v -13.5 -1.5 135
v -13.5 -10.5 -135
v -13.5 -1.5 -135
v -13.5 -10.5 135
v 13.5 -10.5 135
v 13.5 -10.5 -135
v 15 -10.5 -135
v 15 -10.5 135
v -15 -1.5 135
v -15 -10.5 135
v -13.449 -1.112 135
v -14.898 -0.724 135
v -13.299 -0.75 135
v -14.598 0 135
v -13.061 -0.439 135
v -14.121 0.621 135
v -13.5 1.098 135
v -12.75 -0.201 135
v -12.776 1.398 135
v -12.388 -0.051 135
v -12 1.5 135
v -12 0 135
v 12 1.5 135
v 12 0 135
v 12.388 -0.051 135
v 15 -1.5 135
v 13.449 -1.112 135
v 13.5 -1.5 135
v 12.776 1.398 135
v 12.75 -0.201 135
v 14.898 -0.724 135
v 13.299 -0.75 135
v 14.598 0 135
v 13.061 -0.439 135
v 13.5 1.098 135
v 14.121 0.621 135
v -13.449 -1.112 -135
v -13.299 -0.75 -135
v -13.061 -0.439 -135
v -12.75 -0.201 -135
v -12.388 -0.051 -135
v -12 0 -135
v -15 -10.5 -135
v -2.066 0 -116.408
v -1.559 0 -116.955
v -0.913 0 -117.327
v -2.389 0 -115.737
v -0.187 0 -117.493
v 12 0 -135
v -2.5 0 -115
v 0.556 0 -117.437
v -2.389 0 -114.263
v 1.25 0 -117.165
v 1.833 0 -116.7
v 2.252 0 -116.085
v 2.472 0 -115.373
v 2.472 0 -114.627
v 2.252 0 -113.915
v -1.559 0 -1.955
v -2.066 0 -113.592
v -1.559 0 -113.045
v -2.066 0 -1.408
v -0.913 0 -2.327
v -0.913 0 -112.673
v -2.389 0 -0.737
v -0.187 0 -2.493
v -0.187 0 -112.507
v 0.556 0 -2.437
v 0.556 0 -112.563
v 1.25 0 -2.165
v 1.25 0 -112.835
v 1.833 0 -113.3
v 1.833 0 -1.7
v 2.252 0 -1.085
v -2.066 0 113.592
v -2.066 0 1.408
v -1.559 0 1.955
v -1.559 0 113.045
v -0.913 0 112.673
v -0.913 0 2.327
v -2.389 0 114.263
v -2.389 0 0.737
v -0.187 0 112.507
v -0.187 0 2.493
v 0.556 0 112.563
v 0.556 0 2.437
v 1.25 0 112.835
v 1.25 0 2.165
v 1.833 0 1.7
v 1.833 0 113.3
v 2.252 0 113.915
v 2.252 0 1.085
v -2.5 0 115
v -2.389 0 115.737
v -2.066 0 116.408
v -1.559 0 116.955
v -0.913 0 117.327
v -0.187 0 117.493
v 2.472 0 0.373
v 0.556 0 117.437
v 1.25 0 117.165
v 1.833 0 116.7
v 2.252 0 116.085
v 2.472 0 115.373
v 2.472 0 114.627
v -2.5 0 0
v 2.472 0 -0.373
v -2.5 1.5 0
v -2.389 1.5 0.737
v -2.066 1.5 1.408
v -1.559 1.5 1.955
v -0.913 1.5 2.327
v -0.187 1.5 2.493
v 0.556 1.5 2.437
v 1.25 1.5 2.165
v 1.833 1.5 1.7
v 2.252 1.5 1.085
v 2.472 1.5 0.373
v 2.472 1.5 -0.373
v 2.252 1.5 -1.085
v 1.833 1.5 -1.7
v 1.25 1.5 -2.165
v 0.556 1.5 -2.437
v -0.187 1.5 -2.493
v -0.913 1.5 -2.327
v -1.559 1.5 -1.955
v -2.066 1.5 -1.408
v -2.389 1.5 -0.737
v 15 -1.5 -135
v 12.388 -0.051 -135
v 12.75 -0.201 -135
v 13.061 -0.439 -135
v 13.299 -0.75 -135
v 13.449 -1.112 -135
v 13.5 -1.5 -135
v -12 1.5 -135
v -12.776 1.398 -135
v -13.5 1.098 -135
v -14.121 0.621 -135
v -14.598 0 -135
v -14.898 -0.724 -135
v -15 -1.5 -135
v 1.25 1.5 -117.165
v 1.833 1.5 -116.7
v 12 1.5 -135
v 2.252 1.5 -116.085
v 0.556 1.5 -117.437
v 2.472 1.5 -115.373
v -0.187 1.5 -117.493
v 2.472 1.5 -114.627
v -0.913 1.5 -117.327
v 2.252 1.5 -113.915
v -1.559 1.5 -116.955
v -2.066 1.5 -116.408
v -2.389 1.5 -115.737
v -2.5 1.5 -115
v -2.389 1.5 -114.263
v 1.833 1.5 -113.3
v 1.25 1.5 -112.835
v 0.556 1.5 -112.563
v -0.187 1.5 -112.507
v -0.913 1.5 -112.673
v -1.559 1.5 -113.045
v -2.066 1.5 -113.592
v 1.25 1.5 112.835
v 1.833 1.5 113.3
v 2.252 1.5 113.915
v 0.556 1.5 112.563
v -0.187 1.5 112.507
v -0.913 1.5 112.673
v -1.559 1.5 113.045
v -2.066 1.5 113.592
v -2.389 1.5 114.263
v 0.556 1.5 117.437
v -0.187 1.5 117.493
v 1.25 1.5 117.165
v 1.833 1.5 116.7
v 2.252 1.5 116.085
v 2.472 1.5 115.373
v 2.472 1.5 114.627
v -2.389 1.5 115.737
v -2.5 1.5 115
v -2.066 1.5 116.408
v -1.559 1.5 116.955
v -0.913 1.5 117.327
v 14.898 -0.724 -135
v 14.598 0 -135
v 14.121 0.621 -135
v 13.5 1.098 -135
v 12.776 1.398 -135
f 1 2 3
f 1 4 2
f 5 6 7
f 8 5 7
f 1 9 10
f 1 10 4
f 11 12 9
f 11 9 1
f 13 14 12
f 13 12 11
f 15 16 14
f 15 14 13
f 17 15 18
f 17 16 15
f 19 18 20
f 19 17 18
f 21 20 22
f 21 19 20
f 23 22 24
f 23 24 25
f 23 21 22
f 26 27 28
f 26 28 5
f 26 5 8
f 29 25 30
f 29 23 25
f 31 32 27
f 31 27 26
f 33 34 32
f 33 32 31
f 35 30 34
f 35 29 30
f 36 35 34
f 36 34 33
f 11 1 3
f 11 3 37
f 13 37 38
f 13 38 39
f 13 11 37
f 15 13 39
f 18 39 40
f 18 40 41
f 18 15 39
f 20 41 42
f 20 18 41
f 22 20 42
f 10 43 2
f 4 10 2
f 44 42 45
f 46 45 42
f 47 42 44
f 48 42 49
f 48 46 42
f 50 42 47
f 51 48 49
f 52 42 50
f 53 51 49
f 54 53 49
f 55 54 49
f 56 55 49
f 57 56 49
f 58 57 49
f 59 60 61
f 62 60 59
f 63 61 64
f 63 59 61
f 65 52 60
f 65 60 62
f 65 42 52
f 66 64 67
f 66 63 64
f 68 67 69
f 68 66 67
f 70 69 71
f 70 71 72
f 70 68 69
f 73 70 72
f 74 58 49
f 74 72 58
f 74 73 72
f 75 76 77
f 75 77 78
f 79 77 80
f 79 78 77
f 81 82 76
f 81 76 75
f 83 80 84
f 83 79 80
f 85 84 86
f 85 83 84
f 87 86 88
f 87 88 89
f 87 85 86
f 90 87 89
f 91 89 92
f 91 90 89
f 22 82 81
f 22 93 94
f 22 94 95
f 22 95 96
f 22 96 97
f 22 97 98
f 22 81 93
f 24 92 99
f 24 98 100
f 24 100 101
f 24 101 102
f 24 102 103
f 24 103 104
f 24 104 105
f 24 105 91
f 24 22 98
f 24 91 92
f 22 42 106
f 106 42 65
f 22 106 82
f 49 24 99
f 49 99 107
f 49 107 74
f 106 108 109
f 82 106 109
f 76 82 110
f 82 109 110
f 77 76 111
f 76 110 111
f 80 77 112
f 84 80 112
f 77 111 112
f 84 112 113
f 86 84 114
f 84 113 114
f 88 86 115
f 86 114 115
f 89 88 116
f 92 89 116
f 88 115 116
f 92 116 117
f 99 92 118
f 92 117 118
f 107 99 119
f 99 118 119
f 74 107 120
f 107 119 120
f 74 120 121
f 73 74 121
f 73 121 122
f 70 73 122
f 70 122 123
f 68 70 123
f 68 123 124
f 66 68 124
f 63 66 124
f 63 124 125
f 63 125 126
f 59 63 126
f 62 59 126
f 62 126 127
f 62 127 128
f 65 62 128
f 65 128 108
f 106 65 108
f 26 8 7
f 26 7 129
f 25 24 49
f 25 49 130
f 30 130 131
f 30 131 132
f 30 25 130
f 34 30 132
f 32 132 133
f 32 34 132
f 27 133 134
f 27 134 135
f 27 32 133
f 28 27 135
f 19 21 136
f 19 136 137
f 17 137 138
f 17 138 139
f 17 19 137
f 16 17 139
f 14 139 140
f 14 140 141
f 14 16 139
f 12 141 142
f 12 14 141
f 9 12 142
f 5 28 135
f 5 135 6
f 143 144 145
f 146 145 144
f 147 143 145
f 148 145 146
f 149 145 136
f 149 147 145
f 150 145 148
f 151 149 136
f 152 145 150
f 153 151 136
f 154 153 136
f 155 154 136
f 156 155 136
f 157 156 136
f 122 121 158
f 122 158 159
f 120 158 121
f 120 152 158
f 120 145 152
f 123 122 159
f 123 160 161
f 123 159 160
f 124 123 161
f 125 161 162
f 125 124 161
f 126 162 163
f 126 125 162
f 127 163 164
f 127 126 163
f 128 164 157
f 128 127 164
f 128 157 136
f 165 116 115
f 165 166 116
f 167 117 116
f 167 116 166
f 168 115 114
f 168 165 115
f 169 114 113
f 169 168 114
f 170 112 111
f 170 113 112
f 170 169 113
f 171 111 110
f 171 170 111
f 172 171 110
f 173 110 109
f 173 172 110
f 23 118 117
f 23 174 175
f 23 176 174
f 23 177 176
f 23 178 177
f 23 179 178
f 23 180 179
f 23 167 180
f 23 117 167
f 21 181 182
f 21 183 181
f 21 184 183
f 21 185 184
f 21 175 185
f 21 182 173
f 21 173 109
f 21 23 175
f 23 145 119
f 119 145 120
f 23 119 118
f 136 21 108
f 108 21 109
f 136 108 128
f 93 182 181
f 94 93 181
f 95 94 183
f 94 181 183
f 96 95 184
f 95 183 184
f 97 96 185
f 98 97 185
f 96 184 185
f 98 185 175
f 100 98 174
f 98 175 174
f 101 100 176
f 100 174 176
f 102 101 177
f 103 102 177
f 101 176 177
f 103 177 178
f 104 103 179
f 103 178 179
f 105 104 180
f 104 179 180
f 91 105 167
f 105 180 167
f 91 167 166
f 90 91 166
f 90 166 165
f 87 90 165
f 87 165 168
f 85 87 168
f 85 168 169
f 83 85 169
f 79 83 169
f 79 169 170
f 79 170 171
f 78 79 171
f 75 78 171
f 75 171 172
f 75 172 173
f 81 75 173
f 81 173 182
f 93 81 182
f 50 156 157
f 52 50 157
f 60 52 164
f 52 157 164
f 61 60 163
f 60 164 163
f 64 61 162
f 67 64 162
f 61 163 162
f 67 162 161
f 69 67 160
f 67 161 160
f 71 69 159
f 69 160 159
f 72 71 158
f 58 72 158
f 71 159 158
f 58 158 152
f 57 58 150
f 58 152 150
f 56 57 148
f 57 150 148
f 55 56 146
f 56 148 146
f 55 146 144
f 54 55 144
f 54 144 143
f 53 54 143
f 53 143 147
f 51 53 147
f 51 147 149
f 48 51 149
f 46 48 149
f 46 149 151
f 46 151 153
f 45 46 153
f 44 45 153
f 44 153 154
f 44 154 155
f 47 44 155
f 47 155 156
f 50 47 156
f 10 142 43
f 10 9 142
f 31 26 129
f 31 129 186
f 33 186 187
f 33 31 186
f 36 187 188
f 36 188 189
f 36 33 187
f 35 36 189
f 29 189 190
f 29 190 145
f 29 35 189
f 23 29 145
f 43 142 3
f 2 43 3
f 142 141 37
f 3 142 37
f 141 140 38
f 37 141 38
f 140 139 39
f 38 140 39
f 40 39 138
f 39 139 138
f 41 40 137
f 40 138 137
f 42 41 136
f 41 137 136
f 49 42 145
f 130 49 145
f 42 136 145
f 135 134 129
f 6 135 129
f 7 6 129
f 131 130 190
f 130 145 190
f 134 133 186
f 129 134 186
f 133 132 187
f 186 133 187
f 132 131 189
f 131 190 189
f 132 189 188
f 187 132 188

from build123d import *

# Parameters (mm, degrees)
SM_BASE_FLANGE_1_DEPTH = 135
SKETCH_2_R             = 2.5
CUT_EXTRUDE_1_DEPTH    = 10


# Sheet-metal steps are written as plain solids
with BuildPart() as part:
    # Sketch 1 → Базовая кромка1 (new, symmetric)
    with BuildSketch(Plane.XY):
        with BuildLine():
            Line((-13.5, -10.5), (-13.5, -1.5))
            ThreePointArc((-13.5, -1.5), (-13.060660172, -0.439339828), (-12, 0))
            Line((-12, 0), (12, 0))
            ThreePointArc((12, 0), (13.060660172, -0.439339828), (13.5, -1.5))
            Line((13.5, -1.5), (13.5, -10.5))
            Line((13.5, -10.5), (15, -10.5))
            Line((15, -10.5), (15, -1.5))
            ThreePointArc((15, -1.5), (14.121320344, 0.621320344), (12, 1.5))
            Line((12, 1.5), (-12, 1.5))
            ThreePointArc((-12, 1.5), (-14.121320344, 0.621320344), (-15, -1.5))
            Line((-15, -1.5), (-15, -10.5))
            Line((-15, -10.5), (-13.5, -10.5))
        make_face()
    extrude(amount=SM_BASE_FLANGE_1_DEPTH, both=True)

    # Sketch 2 → Вырез-Вытянуть1 (cut)
    with BuildSketch(Plane(origin=(0, 1.5, 0), x_dir=(1, 0, 0), z_dir=(0, 1, 0))):
        with Locations(Location((0, 0, 0), (0, 0, 180))):
            Circle(SKETCH_2_R)
        with Locations((0, 460)):
            Circle(SKETCH_2_R)
        with Locations(Location((0, -115, 0), (0, 0, 180))):
            Circle(SKETCH_2_R)
        with Locations((0, -230)):
            Circle(SKETCH_2_R)
        with Locations((0, -345)):
            Circle(SKETCH_2_R)
        with Locations((0, -460)):
            Circle(SKETCH_2_R)
        with Locations(Location((0, 115, 0), (0, 0, 180))):
            Circle(SKETCH_2_R)
        with Locations((0, 230)):
            Circle(SKETCH_2_R)
        with Locations((0, 345)):
            Circle(SKETCH_2_R)
    extrude(amount=-CUT_EXTRUDE_1_DEPTH, mode=Mode.SUBTRACT)


solid = part.part
